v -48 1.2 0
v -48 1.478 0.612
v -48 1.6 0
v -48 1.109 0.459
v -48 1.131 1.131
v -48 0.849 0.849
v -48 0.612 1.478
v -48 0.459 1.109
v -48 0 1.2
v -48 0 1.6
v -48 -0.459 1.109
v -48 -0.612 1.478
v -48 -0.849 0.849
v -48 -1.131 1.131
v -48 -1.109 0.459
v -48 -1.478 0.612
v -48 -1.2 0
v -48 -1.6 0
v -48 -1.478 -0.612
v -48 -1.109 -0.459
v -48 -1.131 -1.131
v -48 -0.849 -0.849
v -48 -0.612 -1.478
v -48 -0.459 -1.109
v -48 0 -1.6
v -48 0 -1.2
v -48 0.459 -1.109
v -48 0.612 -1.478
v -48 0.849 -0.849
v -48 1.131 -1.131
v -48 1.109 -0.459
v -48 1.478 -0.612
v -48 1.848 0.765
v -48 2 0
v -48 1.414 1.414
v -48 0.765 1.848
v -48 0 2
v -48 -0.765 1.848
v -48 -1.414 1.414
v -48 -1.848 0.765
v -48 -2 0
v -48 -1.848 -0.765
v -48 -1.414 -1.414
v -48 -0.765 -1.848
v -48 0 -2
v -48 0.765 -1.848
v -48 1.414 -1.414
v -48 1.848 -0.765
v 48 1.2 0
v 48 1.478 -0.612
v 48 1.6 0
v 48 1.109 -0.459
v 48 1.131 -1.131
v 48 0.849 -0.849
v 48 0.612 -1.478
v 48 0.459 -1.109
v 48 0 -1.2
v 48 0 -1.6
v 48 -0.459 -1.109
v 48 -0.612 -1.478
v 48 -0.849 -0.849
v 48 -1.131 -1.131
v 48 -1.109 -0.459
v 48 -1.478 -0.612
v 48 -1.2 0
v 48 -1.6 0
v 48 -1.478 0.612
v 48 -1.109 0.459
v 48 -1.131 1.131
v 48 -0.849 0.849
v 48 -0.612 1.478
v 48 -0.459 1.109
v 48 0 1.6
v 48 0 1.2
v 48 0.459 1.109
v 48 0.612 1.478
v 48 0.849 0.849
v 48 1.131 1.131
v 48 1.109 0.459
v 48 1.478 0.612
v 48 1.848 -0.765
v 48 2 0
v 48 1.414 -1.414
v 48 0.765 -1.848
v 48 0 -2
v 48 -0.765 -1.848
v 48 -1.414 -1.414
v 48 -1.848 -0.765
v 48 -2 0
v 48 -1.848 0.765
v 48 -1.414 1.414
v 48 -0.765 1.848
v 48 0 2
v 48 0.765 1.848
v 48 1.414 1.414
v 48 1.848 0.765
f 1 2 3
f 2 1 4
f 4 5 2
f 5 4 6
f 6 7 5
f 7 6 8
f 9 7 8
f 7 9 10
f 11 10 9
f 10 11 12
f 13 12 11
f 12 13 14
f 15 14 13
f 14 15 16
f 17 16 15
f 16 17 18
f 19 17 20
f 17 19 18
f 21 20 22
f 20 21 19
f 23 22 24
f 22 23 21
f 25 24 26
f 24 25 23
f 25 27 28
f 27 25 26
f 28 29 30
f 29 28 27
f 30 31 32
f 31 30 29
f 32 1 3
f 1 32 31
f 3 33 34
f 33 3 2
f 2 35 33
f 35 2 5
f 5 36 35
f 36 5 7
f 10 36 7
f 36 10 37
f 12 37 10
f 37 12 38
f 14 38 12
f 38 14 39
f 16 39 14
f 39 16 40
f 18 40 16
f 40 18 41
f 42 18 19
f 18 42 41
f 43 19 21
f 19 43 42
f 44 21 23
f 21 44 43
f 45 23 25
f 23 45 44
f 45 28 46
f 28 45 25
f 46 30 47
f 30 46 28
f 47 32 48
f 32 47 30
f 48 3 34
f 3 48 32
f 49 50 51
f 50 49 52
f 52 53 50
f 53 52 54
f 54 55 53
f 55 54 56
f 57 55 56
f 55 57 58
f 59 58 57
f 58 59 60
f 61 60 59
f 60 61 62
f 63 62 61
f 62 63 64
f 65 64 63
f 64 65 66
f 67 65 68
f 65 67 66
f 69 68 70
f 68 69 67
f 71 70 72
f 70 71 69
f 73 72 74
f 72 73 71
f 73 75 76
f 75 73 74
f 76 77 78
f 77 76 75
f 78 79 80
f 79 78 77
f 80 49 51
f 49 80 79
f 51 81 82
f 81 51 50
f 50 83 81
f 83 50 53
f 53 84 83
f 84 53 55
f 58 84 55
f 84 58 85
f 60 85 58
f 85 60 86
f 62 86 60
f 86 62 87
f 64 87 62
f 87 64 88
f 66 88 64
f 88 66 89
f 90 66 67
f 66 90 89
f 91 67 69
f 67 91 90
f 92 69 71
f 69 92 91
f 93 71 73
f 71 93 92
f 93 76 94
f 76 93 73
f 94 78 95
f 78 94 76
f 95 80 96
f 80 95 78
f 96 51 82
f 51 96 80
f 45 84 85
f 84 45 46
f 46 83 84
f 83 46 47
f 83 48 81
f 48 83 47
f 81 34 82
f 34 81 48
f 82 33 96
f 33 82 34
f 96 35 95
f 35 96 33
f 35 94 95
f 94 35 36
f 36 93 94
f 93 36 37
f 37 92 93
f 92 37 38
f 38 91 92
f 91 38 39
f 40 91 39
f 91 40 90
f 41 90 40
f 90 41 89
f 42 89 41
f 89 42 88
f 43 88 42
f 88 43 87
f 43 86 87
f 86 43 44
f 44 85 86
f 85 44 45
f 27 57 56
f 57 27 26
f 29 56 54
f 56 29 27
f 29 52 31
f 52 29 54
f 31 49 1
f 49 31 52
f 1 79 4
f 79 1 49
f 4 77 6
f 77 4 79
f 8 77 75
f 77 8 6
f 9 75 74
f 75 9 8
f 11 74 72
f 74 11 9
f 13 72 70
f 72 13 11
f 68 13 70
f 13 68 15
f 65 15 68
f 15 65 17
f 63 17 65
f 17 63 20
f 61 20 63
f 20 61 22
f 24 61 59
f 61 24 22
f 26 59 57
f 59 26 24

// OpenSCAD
// file: ../p/4-4cyli.scad
use <../lib.scad>
function ldraw_lib__4_4cyli() = [
// 0 Cylinder 1.0
// 0 Name: 4-4cyli.dat
// 0 Author: James Jessiman
// 0 !LDRAW_ORG Primitive UPDATE 2005-01
// 0 !LICENSE Licensed under CC BY 4.0 : see CAreadme.txt
// 
// 0 BFC CERTIFY CCW
  [0,"BFC","CERTIFY"],
  [0,"BFC","CCW"],
// 
// 0 !HISTORY 1998-12-15 [PTadmin] Official Update 1998-10
// 0 !HISTORY 2002-03-23 [sbliss] Added BFC statement; merged headers from files in distributions LDraw 0.27 and Complete.
// 0 !HISTORY 2002-04-25 [PTadmin] Official Update 2002-02
// 0 !HISTORY 2004-12-14 [guyvivan] BFC CCW
// 0 !HISTORY 2005-12-28 [PTadmin] Official Update 2005-01
// 0 !HISTORY 2007-06-24 [PTadmin] Header formatted for Contributor Agreement
// 0 !HISTORY 2008-07-01 [PTadmin] Official Update 2008-01
// 
// 
// 4 16 1 1 0 0.9239 1 0.3827 0.9239 0 0.3827 1 0 0
  [4,16,1,1,0,0.9239,1,0.3827,0.9239,0,0.3827,1,0,0],
// 5 24 1 0 0 1 1 0 0.9239 0 0.3827 0.9239 0 -0.3827
  [5,24,1,0,0,1,1,0,0.9239,0,0.3827,0.9239,0,-0.3827],
// 4 16 0.9239 1 0.3827 0.7071 1 0.7071 0.7071 0 0.7071 0.9239 0 0.3827
  [4,16,0.9239,1,0.3827,0.7071,1,0.7071,0.7071,0,0.7071,0.9239,0,0.3827],
// 5 24 0.9239 0 0.3827 0.9239 1 0.3827 0.7071 0 0.7071 1 0 0
  [5,24,0.9239,0,0.3827,0.9239,1,0.3827,0.7071,0,0.7071,1,0,0],
// 4 16 0.7071 1 0.7071 0.3827 1 0.9239 0.3827 0 0.9239 0.7071 0 0.7071
  [4,16,0.7071,1,0.7071,0.3827,1,0.9239,0.3827,0,0.9239,0.7071,0,0.7071],
// 5 24 0.7071 0 0.7071 0.7071 1 0.7071 0.3827 0 0.9239 0.9239 0 0.3827
  [5,24,0.7071,0,0.7071,0.7071,1,0.7071,0.3827,0,0.9239,0.9239,0,0.3827],
// 4 16 0.3827 1 0.9239 0 1 1 0 0 1 0.3827 0 0.9239
  [4,16,0.3827,1,0.9239,0,1,1,0,0,1,0.3827,0,0.9239],
// 5 24 0.3827 0 0.9239 0.3827 1 0.9239 0 0 1 0.7071 0 0.7071
  [5,24,0.3827,0,0.9239,0.3827,1,0.9239,0,0,1,0.7071,0,0.7071],
// 4 16 0 1 1 -0.3827 1 0.9239 -0.3827 0 0.9239 0 0 1
  [4,16,0,1,1,-0.3827,1,0.9239,-0.3827,0,0.9239,0,0,1],
// 5 24 0 0 1 0 1 1 -0.3827 0 0.9239 0.3827 0 0.9239
  [5,24,0,0,1,0,1,1,-0.3827,0,0.9239,0.3827,0,0.9239],
// 4 16 -0.3827 1 0.9239 -0.7071 1 0.7071 -0.7071 0 0.7071 -0.3827 0 0.9239
  [4,16,-0.3827,1,0.9239,-0.7071,1,0.7071,-0.7071,0,0.7071,-0.3827,0,0.9239],
// 5 24 -0.3827 0 0.9239 -0.3827 1 0.9239 -0.7071 0 0.7071 0 0 1
  [5,24,-0.3827,0,0.9239,-0.3827,1,0.9239,-0.7071,0,0.7071,0,0,1],
// 4 16 -0.7071 1 0.7071 -0.9239 1 0.3827 -0.9239 0 0.3827 -0.7071 0 0.7071
  [4,16,-0.7071,1,0.7071,-0.9239,1,0.3827,-0.9239,0,0.3827,-0.7071,0,0.7071],
// 5 24 -0.7071 0 0.7071 -0.7071 1 0.7071 -0.9239 0 0.3827 -0.3827 0 0.9239
  [5,24,-0.7071,0,0.7071,-0.7071,1,0.7071,-0.9239,0,0.3827,-0.3827,0,0.9239],
// 4 16 -0.9239 1 0.3827 -1 1 0 -1 0 0 -0.9239 0 0.3827
  [4,16,-0.9239,1,0.3827,-1,1,0,-1,0,0,-0.9239,0,0.3827],
// 5 24 -0.9239 0 0.3827 -0.9239 1 0.3827 -1 0 0 -0.7071 0 0.7071
  [5,24,-0.9239,0,0.3827,-0.9239,1,0.3827,-1,0,0,-0.7071,0,0.7071],
// 4 16 -1 1 0 -0.9239 1 -0.3827 -0.9239 0 -0.3827 -1 0 0
  [4,16,-1,1,0,-0.9239,1,-0.3827,-0.9239,0,-0.3827,-1,0,0],
// 5 24 -1 0 0 -1 1 0 -0.9239 0 -0.3827 -0.9239 0 0.3827
  [5,24,-1,0,0,-1,1,0,-0.9239,0,-0.3827,-0.9239,0,0.3827],
// 4 16 -0.9239 1 -0.3827 -0.7071 1 -0.7071 -0.7071 0 -0.7071 -0.9239 0 -0.3827
  [4,16,-0.9239,1,-0.3827,-0.7071,1,-0.7071,-0.7071,0,-0.7071,-0.9239,0,-0.3827],
// 5 24 -0.9239 0 -0.3827 -0.9239 1 -0.3827 -0.7071 0 -0.7071 -1 0 0
  [5,24,-0.9239,0,-0.3827,-0.9239,1,-0.3827,-0.7071,0,-0.7071,-1,0,0],
// 4 16 -0.7071 1 -0.7071 -0.3827 1 -0.9239 -0.3827 0 -0.9239 -0.7071 0 -0.7071
  [4,16,-0.7071,1,-0.7071,-0.3827,1,-0.9239,-0.3827,0,-0.9239,-0.7071,0,-0.7071],
// 5 24 -0.7071 0 -0.7071 -0.7071 1 -0.7071 -0.3827 0 -0.9239 -0.9239 0 -0.3827
  [5,24,-0.7071,0,-0.7071,-0.7071,1,-0.7071,-0.3827,0,-0.9239,-0.9239,0,-0.3827],
// 4 16 -0.3827 1 -0.9239 0 1 -1 0 0 -1 -0.3827 0 -0.9239
  [4,16,-0.3827,1,-0.9239,0,1,-1,0,0,-1,-0.3827,0,-0.9239],
// 5 24 -0.3827 0 -0.9239 -0.3827 1 -0.9239 0 0 -1 -0.7071 0 -0.7071
  [5,24,-0.3827,0,-0.9239,-0.3827,1,-0.9239,0,0,-1,-0.7071,0,-0.7071],
// 4 16 0 1 -1 0.3827 1 -0.9239 0.3827 0 -0.9239 0 0 -1
  [4,16,0,1,-1,0.3827,1,-0.9239,0.3827,0,-0.9239,0,0,-1],
// 5 24 0 0 -1 0 1 -1 0.3827 0 -0.9239 -0.3827 0 -0.9239
  [5,24,0,0,-1,0,1,-1,0.3827,0,-0.9239,-0.3827,0,-0.9239],
// 4 16 0.3827 1 -0.9239 0.7071 1 -0.7071 0.7071 0 -0.7071 0.3827 0 -0.9239
  [4,16,0.3827,1,-0.9239,0.7071,1,-0.7071,0.7071,0,-0.7071,0.3827,0,-0.9239],
// 5 24 0.3827 0 -0.9239 0.3827 1 -0.9239 0.7071 0 -0.7071 0 0 -1
  [5,24,0.3827,0,-0.9239,0.3827,1,-0.9239,0.7071,0,-0.7071,0,0,-1],
// 4 16 0.7071 1 -0.7071 0.9239 1 -0.3827 0.9239 0 -0.3827 0.7071 0 -0.7071
  [4,16,0.7071,1,-0.7071,0.9239,1,-0.3827,0.9239,0,-0.3827,0.7071,0,-0.7071],
// 5 24 0.7071 0 -0.7071 0.7071 1 -0.7071 0.9239 0 -0.3827 0.3827 0 -0.9239
  [5,24,0.7071,0,-0.7071,0.7071,1,-0.7071,0.9239,0,-0.3827,0.3827,0,-0.9239],
// 4 16 0.9239 1 -0.3827 1 1 0 1 0 0 0.9239 0 -0.3827
  [4,16,0.9239,1,-0.3827,1,1,0,1,0,0,0.9239,0,-0.3827],
// 5 24 0.9239 0 -0.3827 0.9239 1 -0.3827 1 0 0 0.7071 0 -0.7071
  [5,24,0.9239,0,-0.3827,0.9239,1,-0.3827,1,0,0,0.7071,0,-0.7071],
// 0
];
module ldraw_lib__4_4cyli(step=0, col=false, unit=2/5, alt=false, line=0.2, solid=!$preview)
    makepoly(ldraw_lib__4_4cyli(), step=step, col=col, unit=unit, alt=alt, line=line, solid=solid);
ldraw_lib__4_4cyli(line=0.2);
// file: ../p/4-4ring4.scad
use <../lib.scad>
function ldraw_lib__4_4ring4() = [
// 0 Ring  4 x 1.0
// 0 Name: 4-4ring4.dat
// 0 Author: James Jessiman
// 0 !LDRAW_ORG Primitive UPDATE 2009-01
// 0 !LICENSE Licensed under CC BY 4.0 : see CAreadme.txt
// 
// 0 BFC CERTIFY CCW
  [0,"BFC","CERTIFY"],
  [0,"BFC","CCW"],
// 
// 0 !HISTORY 1998-12-15 [PTadmin] Official Update 1998-10
// 0 !HISTORY 2002-04-08 [BrickCaster] Modified for BFC compliance
// 0 !HISTORY 2002-04-25 [PTadmin] Official Update 2002-02
// 0 !HISTORY 2007-06-24 [PTadmin] Header formatted for Contributor Agreement
// 0 !HISTORY 2008-07-01 [PTadmin] Official Update 2008-01
// 0 !HISTORY 2008-08-26 [cwdee] Switch polygon winding and rename
// 0 !HISTORY 2009-05-02 [PTadmin] Official Update 2009-01
// 
// 
// 4 16 -1.9135 0 4.6195 -1.5308 0 3.6956 0 0 4 0 0 5
  [4,16,-1.9135,0,4.6195,-1.5308,0,3.6956,0,0,4,0,0,5],
// 4 16 -3.5355 0 3.5355 -2.8284 0 2.8284 -1.5308 0 3.6956 -1.9135 0 4.6195
  [4,16,-3.5355,0,3.5355,-2.8284,0,2.8284,-1.5308,0,3.6956,-1.9135,0,4.6195],
// 4 16 -4.6195 0 1.9135 -3.6956 0 1.5308 -2.8284 0 2.8284 -3.5355 0 3.5355
  [4,16,-4.6195,0,1.9135,-3.6956,0,1.5308,-2.8284,0,2.8284,-3.5355,0,3.5355],
// 4 16 -5 0 0 -4 0 0 -3.6956 0 1.5308 -4.6195 0 1.9135
  [4,16,-5,0,0,-4,0,0,-3.6956,0,1.5308,-4.6195,0,1.9135],
// 4 16 -4.6195 0 -1.9135 -3.6956 0 -1.5308 -4 0 0 -5 0 0
  [4,16,-4.6195,0,-1.9135,-3.6956,0,-1.5308,-4,0,0,-5,0,0],
// 4 16 -3.5355 0 -3.5355 -2.8284 0 -2.8284 -3.6956 0 -1.5308 -4.6195 0 -1.9135
  [4,16,-3.5355,0,-3.5355,-2.8284,0,-2.8284,-3.6956,0,-1.5308,-4.6195,0,-1.9135],
// 4 16 -1.9135 0 -4.6195 -1.5308 0 -3.6956 -2.8284 0 -2.8284 -3.5355 0 -3.5355
  [4,16,-1.9135,0,-4.6195,-1.5308,0,-3.6956,-2.8284,0,-2.8284,-3.5355,0,-3.5355],
// 4 16 0 0 -5 0 0 -4 -1.5308 0 -3.6956 -1.9135 0 -4.6195
  [4,16,0,0,-5,0,0,-4,-1.5308,0,-3.6956,-1.9135,0,-4.6195],
// 4 16 1.9135 0 -4.6195 1.5308 0 -3.6956 0 0 -4 0 0 -5
  [4,16,1.9135,0,-4.6195,1.5308,0,-3.6956,0,0,-4,0,0,-5],
// 4 16 3.5355 0 -3.5355 2.8284 0 -2.8284 1.5308 0 -3.6956 1.9135 0 -4.6195
  [4,16,3.5355,0,-3.5355,2.8284,0,-2.8284,1.5308,0,-3.6956,1.9135,0,-4.6195],
// 4 16 4.6195 0 -1.9135 3.6956 0 -1.5308 2.8284 0 -2.8284 3.5355 0 -3.5355
  [4,16,4.6195,0,-1.9135,3.6956,0,-1.5308,2.8284,0,-2.8284,3.5355,0,-3.5355],
// 4 16 5 0 0 4 0 0 3.6956 0 -1.5308 4.6195 0 -1.9135
  [4,16,5,0,0,4,0,0,3.6956,0,-1.5308,4.6195,0,-1.9135],
// 4 16 4.6195 0 1.9135 3.6956 0 1.5308 4 0 0 5 0 0
  [4,16,4.6195,0,1.9135,3.6956,0,1.5308,4,0,0,5,0,0],
// 4 16 3.5355 0 3.5355 2.8284 0 2.8284 3.6956 0 1.5308 4.6195 0 1.9135
  [4,16,3.5355,0,3.5355,2.8284,0,2.8284,3.6956,0,1.5308,4.6195,0,1.9135],
// 4 16 1.9135 0 4.6195 1.5308 0 3.6956 2.8284 0 2.8284 3.5355 0 3.5355
  [4,16,1.9135,0,4.6195,1.5308,0,3.6956,2.8284,0,2.8284,3.5355,0,3.5355],
// 4 16 0 0 5 0 0 4 1.5308 0 3.6956 1.9135 0 4.6195
  [4,16,0,0,5,0,0,4,1.5308,0,3.6956,1.9135,0,4.6195],
// 0
];
module ldraw_lib__4_4ring4(step=0, col=false, unit=2/5, alt=false, line=0.2, solid=!$preview)
    makepoly(ldraw_lib__4_4ring4(), step=step, col=col, unit=unit, alt=alt, line=line, solid=solid);
ldraw_lib__4_4ring4(line=0.2);
// file: ../p/4-4ring3.scad
use <../lib.scad>
function ldraw_lib__4_4ring3() = [
// 0 Ring  3 x 1.0
// 0 Name: 4-4ring3.dat
// 0 Author: James Jessiman
// 0 !LDRAW_ORG Primitive UPDATE 2009-01
// 0 !LICENSE Licensed under CC BY 4.0 : see CAreadme.txt
// 
// 0 BFC CERTIFY CCW
  [0,"BFC","CERTIFY"],
  [0,"BFC","CCW"],
// 
// 0 !HISTORY 1998-12-15 [PTadmin] Official Update 1998-10
// 0 !HISTORY 2002-04-05 [hafhead] Added BFC statement
// 0 !HISTORY 2002-04-25 [PTadmin] Official Update 2002-02
// 0 !HISTORY 2007-06-24 [PTadmin] Header formatted for Contributor Agreement
// 0 !HISTORY 2008-07-01 [PTadmin] Official Update 2008-01
// 0 !HISTORY 2008-08-26 [cwdee] Switch polygon winding and rename
// 0 !HISTORY 2009-05-02 [PTadmin] Official Update 2009-01
// 
// 
// 4 16 -1.5308 0 3.6956 -1.1481 0 2.7717 0 0 3 0 0 4
  [4,16,-1.5308,0,3.6956,-1.1481,0,2.7717,0,0,3,0,0,4],
// 4 16 -2.8284 0 2.8284 -2.1213 0 2.1213 -1.1481 0 2.7717 -1.5308 0 3.6956
  [4,16,-2.8284,0,2.8284,-2.1213,0,2.1213,-1.1481,0,2.7717,-1.5308,0,3.6956],
// 4 16 -3.6956 0 1.5308 -2.7717 0 1.1481 -2.1213 0 2.1213 -2.8284 0 2.8284
  [4,16,-3.6956,0,1.5308,-2.7717,0,1.1481,-2.1213,0,2.1213,-2.8284,0,2.8284],
// 4 16 -4 0 0 -3 0 0 -2.7717 0 1.1481 -3.6956 0 1.5308
  [4,16,-4,0,0,-3,0,0,-2.7717,0,1.1481,-3.6956,0,1.5308],
// 4 16 -3.6956 0 -1.5308 -2.7717 0 -1.1481 -3 0 0 -4 0 0
  [4,16,-3.6956,0,-1.5308,-2.7717,0,-1.1481,-3,0,0,-4,0,0],
// 4 16 -2.8284 0 -2.8284 -2.1213 0 -2.1213 -2.7717 0 -1.1481 -3.6956 0 -1.5308
  [4,16,-2.8284,0,-2.8284,-2.1213,0,-2.1213,-2.7717,0,-1.1481,-3.6956,0,-1.5308],
// 4 16 -1.5308 0 -3.6956 -1.1481 0 -2.7717 -2.1213 0 -2.1213 -2.8284 0 -2.8284
  [4,16,-1.5308,0,-3.6956,-1.1481,0,-2.7717,-2.1213,0,-2.1213,-2.8284,0,-2.8284],
// 4 16 0 0 -4 0 0 -3 -1.1481 0 -2.7717 -1.5308 0 -3.6956
  [4,16,0,0,-4,0,0,-3,-1.1481,0,-2.7717,-1.5308,0,-3.6956],
// 4 16 1.5308 0 -3.6956 1.1481 0 -2.7717 0 0 -3 0 0 -4
  [4,16,1.5308,0,-3.6956,1.1481,0,-2.7717,0,0,-3,0,0,-4],
// 4 16 2.8284 0 -2.8284 2.1213 0 -2.1213 1.1481 0 -2.7717 1.5308 0 -3.6956
  [4,16,2.8284,0,-2.8284,2.1213,0,-2.1213,1.1481,0,-2.7717,1.5308,0,-3.6956],
// 4 16 3.6956 0 -1.5308 2.7717 0 -1.1481 2.1213 0 -2.1213 2.8284 0 -2.8284
  [4,16,3.6956,0,-1.5308,2.7717,0,-1.1481,2.1213,0,-2.1213,2.8284,0,-2.8284],
// 4 16 4 0 0 3 0 0 2.7717 0 -1.1481 3.6956 0 -1.5308
  [4,16,4,0,0,3,0,0,2.7717,0,-1.1481,3.6956,0,-1.5308],
// 4 16 3.6956 0 1.5308 2.7717 0 1.1481 3 0 0 4 0 0
  [4,16,3.6956,0,1.5308,2.7717,0,1.1481,3,0,0,4,0,0],
// 4 16 2.8284 0 2.8284 2.1213 0 2.1213 2.7717 0 1.1481 3.6956 0 1.5308
  [4,16,2.8284,0,2.8284,2.1213,0,2.1213,2.7717,0,1.1481,3.6956,0,1.5308],
// 4 16 1.5308 0 3.6956 1.1481 0 2.7717 2.1213 0 2.1213 2.8284 0 2.8284
  [4,16,1.5308,0,3.6956,1.1481,0,2.7717,2.1213,0,2.1213,2.8284,0,2.8284],
// 4 16 0 0 4 0 0 3 1.1481 0 2.7717 1.5308 0 3.6956
  [4,16,0,0,4,0,0,3,1.1481,0,2.7717,1.5308,0,3.6956],
// 0
];
module ldraw_lib__4_4ring3(step=0, col=false, unit=2/5, alt=false, line=0.2, solid=!$preview)
    makepoly(ldraw_lib__4_4ring3(), step=step, col=col, unit=unit, alt=alt, line=line, solid=solid);
ldraw_lib__4_4ring3(line=0.2);
// file: ../p/4-4edge.scad
use <../lib.scad>
function ldraw_lib__4_4edge() = [
// 0 Circle 1.0
// 0 Name: 4-4edge.dat
// 0 Author: James Jessiman
// 0 !LDRAW_ORG Primitive UPDATE 2017-01
// 0 !LICENSE Licensed under CC BY 4.0 : see CAreadme.txt
// 
// 0 BFC CERTIFY CCW
  [0,"BFC","CERTIFY"],
  [0,"BFC","CCW"],
// 
// 0 !HISTORY 1998-12-15 [PTadmin] Official Update 1998-10
// 0 !HISTORY 2005-12-28 [PTadmin] Official Update 2005-01
// 0 !HISTORY 2007-06-24 [PTadmin] Header formatted for Contributor Agreement
// 0 !HISTORY 2008-07-01 [PTadmin] Official Update 2008-01
// 0 !HISTORY 2017-01-15 [Steffen] BFCed
// 0 !HISTORY 2017-12-30 [PTadmin] Official Update 2017-01
// 
// 
// 2 24 1 0 0 0.9239 0 0.3827
  [2,24,1,0,0,0.9239,0,0.3827],
// 2 24 0.9239 0 0.3827 0.7071 0 0.7071
  [2,24,0.9239,0,0.3827,0.7071,0,0.7071],
// 2 24 0.7071 0 0.7071 0.3827 0 0.9239
  [2,24,0.7071,0,0.7071,0.3827,0,0.9239],
// 2 24 0.3827 0 0.9239 0 0 1
  [2,24,0.3827,0,0.9239,0,0,1],
// 2 24 0 0 1 -0.3827 0 0.9239
  [2,24,0,0,1,-0.3827,0,0.9239],
// 2 24 -0.3827 0 0.9239 -0.7071 0 0.7071
  [2,24,-0.3827,0,0.9239,-0.7071,0,0.7071],
// 2 24 -0.7071 0 0.7071 -0.9239 0 0.3827
  [2,24,-0.7071,0,0.7071,-0.9239,0,0.3827],
// 2 24 -0.9239 0 0.3827 -1 0 -0
  [2,24,-0.9239,0,0.3827,-1,0,-0],
// 2 24 -1 0 -0 -0.9239 0 -0.3827
  [2,24,-1,0,-0,-0.9239,0,-0.3827],
// 2 24 -0.9239 0 -0.3827 -0.7071 0 -0.7071
  [2,24,-0.9239,0,-0.3827,-0.7071,0,-0.7071],
// 2 24 -0.7071 0 -0.7071 -0.3827 0 -0.9239
  [2,24,-0.7071,0,-0.7071,-0.3827,0,-0.9239],
// 2 24 -0.3827 0 -0.9239 0 0 -1
  [2,24,-0.3827,0,-0.9239,0,0,-1],
// 2 24 0 0 -1 0.3827 0 -0.9239
  [2,24,0,0,-1,0.3827,0,-0.9239],
// 2 24 0.3827 0 -0.9239 0.7071 0 -0.7071
  [2,24,0.3827,0,-0.9239,0.7071,0,-0.7071],
// 2 24 0.7071 0 -0.7071 0.9239 0 -0.3827
  [2,24,0.7071,0,-0.7071,0.9239,0,-0.3827],
// 2 24 0.9239 0 -0.3827 1 0 0
  [2,24,0.9239,0,-0.3827,1,0,0],
];
module ldraw_lib__4_4edge(step=0, col=false, unit=2/5, alt=false, line=0.2, solid=!$preview)
    makepoly(ldraw_lib__4_4edge(), step=step, col=col, unit=unit, alt=alt, line=line, solid=solid);
ldraw_lib__4_4edge(line=0.2);
// file: 71533k03.scad
use <../lib.scad>
use <../p/4-4cyli.scad>
function ldraw_lib__71533k03() = [
// 0 ~Technic Pneumatic Tube Segment
// 0 Name: 71533k03.dat
// 0 Author: Jaco van der Molen [Jaco]
// 0 !LDRAW_ORG Part Flexible_Section UPDATE 2020-01
// 0 !LICENSE Licensed under CC BY 4.0 : see CAreadme.txt
// 
// 0 BFC CERTIFY CW
  [0,"BFC","CERTIFY"],
  [0,"BFC","CW"],
// 
// 0 !HISTORY 2003-11-30 [Steffen] BFCed
// 0 !HISTORY 2009-12-29 [PTadmin] Official Update 2009-03
// 0 !HISTORY 2020-06-27 [PTadmin] Renamed from 166
// 0 !HISTORY 2020-06-28 [PTadmin] Official Update 2020-01
// 
// 
// 1 16 0 0 0 5 0 0 0 1 0 0 0 5 4-4cyli.dat
  [1,16,0,0,0,5,0,0,0,1,0,0,0,5, ldraw_lib__4_4cyli()],
// 0 BFC INVERTNEXT
  [0,"BFC","INVERTNEXT"],
// 1 16 0 0 0 3 0 0 0 1 0 0 0 3 4-4cyli.dat
  [1,16,0,0,0,3,0,0,0,1,0,0,0,3, ldraw_lib__4_4cyli()],
// 0
];
module ldraw_lib__71533k03(step=0, col=false, unit=2/5, alt=false, line=0.2, solid=!$preview)
    makepoly(ldraw_lib__71533k03(), step=step, col=col, unit=unit, alt=alt, line=line, solid=solid);
ldraw_lib__71533k03(line=0.2);
// file: 71533k02.scad
use <../lib.scad>
use <../p/4-4edge.scad>
use <../p/4-4ring3.scad>
use <../p/4-4ring4.scad>
function ldraw_lib__71533k02() = [
// 0 ~Technic Pneumatic Tube End (Non-Bulged)
// 0 Name: 71533k02.dat
// 0 Author: Steffen [Steffen]
// 0 !LDRAW_ORG Part Flexible_Section UPDATE 2020-01
// 0 !LICENSE Licensed under CC BY 4.0 : see CAreadme.txt
// 
// 0 BFC CERTIFY CCW
  [0,"BFC","CERTIFY"],
  [0,"BFC","CCW"],
// 
// 0 !HISTORY 2020-06-28 [PTadmin] Official Update 2020-01
// 
// 
// 0 // This file goes together with 71533k01.dat and 71533k03.dat.
// 0 // Those 3 files can be used to create Technic Pneumatic Tubes
// 0 // with either bulged or non-bulged ends.
// 
// 1 16 0 0 0 1 0 0 0 1 0 0 0 1 4-4ring3.dat
  [1,16,0,0,0,1,0,0,0,1,0,0,0,1, ldraw_lib__4_4ring3()],
// 1 16 0 0 0 1 0 0 0 1 0 0 0 1 4-4ring4.dat
  [1,16,0,0,0,1,0,0,0,1,0,0,0,1, ldraw_lib__4_4ring4()],
// 1 16 0 0 0 3 0 0 0 3 0 0 0 3 4-4edge.dat
  [1,16,0,0,0,3,0,0,0,3,0,0,0,3, ldraw_lib__4_4edge()],
// 1 16 0 0 0 5 0 0 0 5 0 0 0 5 4-4edge.dat
  [1,16,0,0,0,5,0,0,0,5,0,0,0,5, ldraw_lib__4_4edge()],
];
module ldraw_lib__71533k02(step=0, col=false, unit=2/5, alt=false, line=0.2, solid=!$preview)
    makepoly(ldraw_lib__71533k02(), step=step, col=col, unit=unit, alt=alt, line=line, solid=solid);
ldraw_lib__71533k02(line=0.2);
// main file
use <../lib.scad>
use <71533k02.scad>
use <71533k03.scad>
function ldraw_lib__63539_f1() = [
// 0 Technic Pneumatic Tube 12L
// 0 Name: 63539-f1.dat
// 0 Author: Philippe Hurbain [Philo]
// 0 !LDRAW_ORG Part UPDATE 2020-02
// 0 !LICENSE Licensed under CC BY 4.0 : see CAreadme.txt
// 
// 0 BFC CERTIFY CCW
  [0,"BFC","CERTIFY"],
  [0,"BFC","CCW"],
// 
// 0 !KEYWORDS 96 mm, BrickLink 5102c12, Rebrickable 5102c12
// 
// 0 !HISTORY 2020-09-05 [PTadmin] Official Update 2020-02
// 
// 
// 1 16 -120 0 0 0 1 0 1 0 0 0 0 1 71533k02.dat
  [1,16,-120,0,0,0,1,0,1,0,0,0,0,1, ldraw_lib__71533k02()],
// 1 16 120 0 0 0 -1 0 -1 0 0 0 0 1 71533k02.dat
  [1,16,120,0,0,0,-1,0,-1,0,0,0,0,1, ldraw_lib__71533k02()],
// 1 16 -120 0 0 0 240 0 1 0 0 0 0 1 71533k03.dat
  [1,16,-120,0,0,0,240,0,1,0,0,0,0,1, ldraw_lib__71533k03()],
];
module ldraw_lib__63539_f1(step=0, col=false, unit=2/5, alt=false, line=0.2, solid=!$preview)
    makepoly(ldraw_lib__63539_f1(), step=step, col=col, unit=unit, alt=alt, line=line, solid=solid);
ldraw_lib__63539_f1(line=0.2);
